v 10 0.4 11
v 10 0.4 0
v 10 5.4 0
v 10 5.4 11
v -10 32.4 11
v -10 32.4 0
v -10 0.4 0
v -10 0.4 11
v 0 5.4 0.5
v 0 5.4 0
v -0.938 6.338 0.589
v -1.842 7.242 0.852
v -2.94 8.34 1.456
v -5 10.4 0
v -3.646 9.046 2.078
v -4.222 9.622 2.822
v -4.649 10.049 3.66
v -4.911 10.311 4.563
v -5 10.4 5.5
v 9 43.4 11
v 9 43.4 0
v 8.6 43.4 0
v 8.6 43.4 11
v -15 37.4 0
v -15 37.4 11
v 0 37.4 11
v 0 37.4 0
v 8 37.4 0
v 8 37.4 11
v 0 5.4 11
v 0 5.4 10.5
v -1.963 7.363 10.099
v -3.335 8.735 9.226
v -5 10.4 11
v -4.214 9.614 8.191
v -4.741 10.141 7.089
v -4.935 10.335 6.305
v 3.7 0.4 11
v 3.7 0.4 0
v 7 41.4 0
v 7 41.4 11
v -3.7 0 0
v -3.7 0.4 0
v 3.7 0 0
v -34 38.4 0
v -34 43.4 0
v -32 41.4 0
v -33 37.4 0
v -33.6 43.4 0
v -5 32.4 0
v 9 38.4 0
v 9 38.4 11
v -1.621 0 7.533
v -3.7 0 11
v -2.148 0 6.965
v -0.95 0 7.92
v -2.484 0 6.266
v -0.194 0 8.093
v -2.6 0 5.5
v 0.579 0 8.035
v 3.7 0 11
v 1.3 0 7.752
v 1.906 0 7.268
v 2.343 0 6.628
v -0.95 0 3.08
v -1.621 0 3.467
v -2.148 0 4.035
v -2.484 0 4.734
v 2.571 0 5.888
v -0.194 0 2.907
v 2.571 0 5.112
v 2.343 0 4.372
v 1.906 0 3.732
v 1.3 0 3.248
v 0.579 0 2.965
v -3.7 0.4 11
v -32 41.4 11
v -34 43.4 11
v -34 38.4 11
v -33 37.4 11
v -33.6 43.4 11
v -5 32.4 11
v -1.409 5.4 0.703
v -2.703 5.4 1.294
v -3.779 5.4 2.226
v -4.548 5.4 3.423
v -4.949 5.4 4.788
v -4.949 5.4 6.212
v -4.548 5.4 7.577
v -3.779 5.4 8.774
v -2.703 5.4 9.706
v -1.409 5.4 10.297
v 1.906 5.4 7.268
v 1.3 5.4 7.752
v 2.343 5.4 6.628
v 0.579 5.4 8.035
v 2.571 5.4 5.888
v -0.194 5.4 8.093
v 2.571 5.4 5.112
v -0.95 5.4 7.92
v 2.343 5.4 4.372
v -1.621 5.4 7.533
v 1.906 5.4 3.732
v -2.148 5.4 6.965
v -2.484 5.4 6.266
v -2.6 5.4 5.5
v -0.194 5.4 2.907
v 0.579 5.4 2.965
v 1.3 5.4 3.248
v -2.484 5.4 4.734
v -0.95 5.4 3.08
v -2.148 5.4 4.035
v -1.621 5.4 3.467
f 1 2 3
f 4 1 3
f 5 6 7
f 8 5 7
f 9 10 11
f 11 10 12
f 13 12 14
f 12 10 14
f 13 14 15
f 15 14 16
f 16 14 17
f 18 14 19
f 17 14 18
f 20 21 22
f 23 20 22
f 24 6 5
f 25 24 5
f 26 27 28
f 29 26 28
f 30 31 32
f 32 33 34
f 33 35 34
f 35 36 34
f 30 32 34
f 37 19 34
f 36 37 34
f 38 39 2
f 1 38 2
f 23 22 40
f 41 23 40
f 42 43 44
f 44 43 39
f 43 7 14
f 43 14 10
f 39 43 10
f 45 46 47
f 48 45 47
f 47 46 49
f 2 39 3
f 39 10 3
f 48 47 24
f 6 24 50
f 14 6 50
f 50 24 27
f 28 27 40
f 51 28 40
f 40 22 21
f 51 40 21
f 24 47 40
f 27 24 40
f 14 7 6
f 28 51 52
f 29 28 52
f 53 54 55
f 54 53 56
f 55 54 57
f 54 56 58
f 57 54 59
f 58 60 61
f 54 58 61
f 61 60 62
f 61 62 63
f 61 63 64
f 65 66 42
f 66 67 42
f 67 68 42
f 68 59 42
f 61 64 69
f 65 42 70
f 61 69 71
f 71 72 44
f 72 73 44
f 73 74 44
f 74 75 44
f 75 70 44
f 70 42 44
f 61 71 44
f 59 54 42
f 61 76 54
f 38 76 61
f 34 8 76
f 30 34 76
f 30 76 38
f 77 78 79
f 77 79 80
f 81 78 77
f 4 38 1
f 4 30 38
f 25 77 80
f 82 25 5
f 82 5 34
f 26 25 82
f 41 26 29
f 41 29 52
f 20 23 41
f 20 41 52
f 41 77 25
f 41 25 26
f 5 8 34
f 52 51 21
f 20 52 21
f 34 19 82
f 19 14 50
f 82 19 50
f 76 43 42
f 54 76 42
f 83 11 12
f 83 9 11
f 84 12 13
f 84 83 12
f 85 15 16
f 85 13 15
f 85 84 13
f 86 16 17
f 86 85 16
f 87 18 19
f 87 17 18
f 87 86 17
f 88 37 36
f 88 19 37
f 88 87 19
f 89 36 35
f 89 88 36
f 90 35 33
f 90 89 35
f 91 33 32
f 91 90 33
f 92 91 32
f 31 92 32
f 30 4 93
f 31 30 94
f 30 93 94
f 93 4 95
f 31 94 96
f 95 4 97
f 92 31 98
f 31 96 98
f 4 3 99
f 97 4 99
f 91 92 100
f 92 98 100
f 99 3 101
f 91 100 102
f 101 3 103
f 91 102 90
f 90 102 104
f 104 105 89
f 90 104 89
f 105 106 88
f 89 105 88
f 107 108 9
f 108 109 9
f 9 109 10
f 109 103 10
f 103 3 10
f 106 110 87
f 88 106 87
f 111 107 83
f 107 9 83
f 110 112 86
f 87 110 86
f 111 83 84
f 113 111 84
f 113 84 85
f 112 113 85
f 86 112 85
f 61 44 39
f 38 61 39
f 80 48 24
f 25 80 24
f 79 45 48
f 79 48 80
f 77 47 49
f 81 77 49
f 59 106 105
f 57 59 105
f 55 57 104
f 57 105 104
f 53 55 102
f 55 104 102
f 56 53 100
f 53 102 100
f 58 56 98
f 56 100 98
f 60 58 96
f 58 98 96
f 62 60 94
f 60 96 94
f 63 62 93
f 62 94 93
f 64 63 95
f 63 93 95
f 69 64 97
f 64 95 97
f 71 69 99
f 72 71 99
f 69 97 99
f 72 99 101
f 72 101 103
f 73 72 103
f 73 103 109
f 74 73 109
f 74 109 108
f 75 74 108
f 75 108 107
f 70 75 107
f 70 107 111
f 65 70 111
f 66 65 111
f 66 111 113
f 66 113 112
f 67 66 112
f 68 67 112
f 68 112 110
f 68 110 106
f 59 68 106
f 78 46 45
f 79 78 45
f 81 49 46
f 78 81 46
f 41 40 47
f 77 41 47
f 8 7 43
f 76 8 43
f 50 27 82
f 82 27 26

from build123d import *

# Parameters (mm, degrees)
EXTRUDE_1_DEPTH     = 11
CHAMFER_2_SIZE      = 5
CHAMFER_3_SIZE      = 1
SKETCH_2_R          = 2.6
CUT_EXTRUDE_1_DEPTH = 53.163205423
SKETCH_3_R          = 5
CUT_EXTRUDE_2_DEPTH = 5


with BuildPart() as part:
    # Эскиз1 → Бобышка-Вытянуть1 (new body)
    with BuildSketch(Plane.XY):
        Polygon((-10, 0.4), (-3.7, 0.4), (-3.7, 0), (3.7, 0), (3.7, 0.4), (10, 0.4), (10, 5.4), (-5, 5.4), (-5, 37.4), (9, 37.4), (9, 43.4), (8.6, 43.4), (7, 41.4), (-32, 41.4), (-33.6, 43.4), (-34, 43.4), (-34, 37.4), (-10, 37.4), align=None)
    extrude(amount=EXTRUDE_1_DEPTH)

    # Фаска2
    chamfer_2_edges = [part.edges().sort_by_distance(p)[0] for p in [
        (-10, 37.4, 5.5),
        (-5, 37.4, 5.5),
        (-5, 5.4, 5.5),
    ]]
    chamfer(chamfer_2_edges, length=CHAMFER_2_SIZE)

    # Фаска3
    chamfer_3_edges = [part.edges().sort_by_distance(p)[0] for p in [
        (-34, 37.4, 5.5),
        (9, 37.4, 5.5),
    ]]
    chamfer(chamfer_3_edges, length=CHAMFER_3_SIZE)

    # Эскиз2 → Вырез-Вытянуть1 (cut, through all)
    with BuildSketch(Plane(origin=(0, 5.4, 0), x_dir=(1, 0, 0), z_dir=(0, 1, 0))):
        with Locations(Location((0, -5.5, 0), (0, 0, 180))):
            Circle(SKETCH_2_R)
    extrude(amount=-CUT_EXTRUDE_1_DEPTH, mode=Mode.SUBTRACT)

    # Эскиз3 → Вырез-Вытянуть2 (cut)
    with BuildSketch(Plane(origin=(0, 5.4, 0), x_dir=(1, 0, 0), z_dir=(0, 1, 0))):
        with Locations((0, -5.5)):
            Circle(SKETCH_3_R)
    extrude(amount=CUT_EXTRUDE_2_DEPTH, mode=Mode.SUBTRACT)


solid = part.part
